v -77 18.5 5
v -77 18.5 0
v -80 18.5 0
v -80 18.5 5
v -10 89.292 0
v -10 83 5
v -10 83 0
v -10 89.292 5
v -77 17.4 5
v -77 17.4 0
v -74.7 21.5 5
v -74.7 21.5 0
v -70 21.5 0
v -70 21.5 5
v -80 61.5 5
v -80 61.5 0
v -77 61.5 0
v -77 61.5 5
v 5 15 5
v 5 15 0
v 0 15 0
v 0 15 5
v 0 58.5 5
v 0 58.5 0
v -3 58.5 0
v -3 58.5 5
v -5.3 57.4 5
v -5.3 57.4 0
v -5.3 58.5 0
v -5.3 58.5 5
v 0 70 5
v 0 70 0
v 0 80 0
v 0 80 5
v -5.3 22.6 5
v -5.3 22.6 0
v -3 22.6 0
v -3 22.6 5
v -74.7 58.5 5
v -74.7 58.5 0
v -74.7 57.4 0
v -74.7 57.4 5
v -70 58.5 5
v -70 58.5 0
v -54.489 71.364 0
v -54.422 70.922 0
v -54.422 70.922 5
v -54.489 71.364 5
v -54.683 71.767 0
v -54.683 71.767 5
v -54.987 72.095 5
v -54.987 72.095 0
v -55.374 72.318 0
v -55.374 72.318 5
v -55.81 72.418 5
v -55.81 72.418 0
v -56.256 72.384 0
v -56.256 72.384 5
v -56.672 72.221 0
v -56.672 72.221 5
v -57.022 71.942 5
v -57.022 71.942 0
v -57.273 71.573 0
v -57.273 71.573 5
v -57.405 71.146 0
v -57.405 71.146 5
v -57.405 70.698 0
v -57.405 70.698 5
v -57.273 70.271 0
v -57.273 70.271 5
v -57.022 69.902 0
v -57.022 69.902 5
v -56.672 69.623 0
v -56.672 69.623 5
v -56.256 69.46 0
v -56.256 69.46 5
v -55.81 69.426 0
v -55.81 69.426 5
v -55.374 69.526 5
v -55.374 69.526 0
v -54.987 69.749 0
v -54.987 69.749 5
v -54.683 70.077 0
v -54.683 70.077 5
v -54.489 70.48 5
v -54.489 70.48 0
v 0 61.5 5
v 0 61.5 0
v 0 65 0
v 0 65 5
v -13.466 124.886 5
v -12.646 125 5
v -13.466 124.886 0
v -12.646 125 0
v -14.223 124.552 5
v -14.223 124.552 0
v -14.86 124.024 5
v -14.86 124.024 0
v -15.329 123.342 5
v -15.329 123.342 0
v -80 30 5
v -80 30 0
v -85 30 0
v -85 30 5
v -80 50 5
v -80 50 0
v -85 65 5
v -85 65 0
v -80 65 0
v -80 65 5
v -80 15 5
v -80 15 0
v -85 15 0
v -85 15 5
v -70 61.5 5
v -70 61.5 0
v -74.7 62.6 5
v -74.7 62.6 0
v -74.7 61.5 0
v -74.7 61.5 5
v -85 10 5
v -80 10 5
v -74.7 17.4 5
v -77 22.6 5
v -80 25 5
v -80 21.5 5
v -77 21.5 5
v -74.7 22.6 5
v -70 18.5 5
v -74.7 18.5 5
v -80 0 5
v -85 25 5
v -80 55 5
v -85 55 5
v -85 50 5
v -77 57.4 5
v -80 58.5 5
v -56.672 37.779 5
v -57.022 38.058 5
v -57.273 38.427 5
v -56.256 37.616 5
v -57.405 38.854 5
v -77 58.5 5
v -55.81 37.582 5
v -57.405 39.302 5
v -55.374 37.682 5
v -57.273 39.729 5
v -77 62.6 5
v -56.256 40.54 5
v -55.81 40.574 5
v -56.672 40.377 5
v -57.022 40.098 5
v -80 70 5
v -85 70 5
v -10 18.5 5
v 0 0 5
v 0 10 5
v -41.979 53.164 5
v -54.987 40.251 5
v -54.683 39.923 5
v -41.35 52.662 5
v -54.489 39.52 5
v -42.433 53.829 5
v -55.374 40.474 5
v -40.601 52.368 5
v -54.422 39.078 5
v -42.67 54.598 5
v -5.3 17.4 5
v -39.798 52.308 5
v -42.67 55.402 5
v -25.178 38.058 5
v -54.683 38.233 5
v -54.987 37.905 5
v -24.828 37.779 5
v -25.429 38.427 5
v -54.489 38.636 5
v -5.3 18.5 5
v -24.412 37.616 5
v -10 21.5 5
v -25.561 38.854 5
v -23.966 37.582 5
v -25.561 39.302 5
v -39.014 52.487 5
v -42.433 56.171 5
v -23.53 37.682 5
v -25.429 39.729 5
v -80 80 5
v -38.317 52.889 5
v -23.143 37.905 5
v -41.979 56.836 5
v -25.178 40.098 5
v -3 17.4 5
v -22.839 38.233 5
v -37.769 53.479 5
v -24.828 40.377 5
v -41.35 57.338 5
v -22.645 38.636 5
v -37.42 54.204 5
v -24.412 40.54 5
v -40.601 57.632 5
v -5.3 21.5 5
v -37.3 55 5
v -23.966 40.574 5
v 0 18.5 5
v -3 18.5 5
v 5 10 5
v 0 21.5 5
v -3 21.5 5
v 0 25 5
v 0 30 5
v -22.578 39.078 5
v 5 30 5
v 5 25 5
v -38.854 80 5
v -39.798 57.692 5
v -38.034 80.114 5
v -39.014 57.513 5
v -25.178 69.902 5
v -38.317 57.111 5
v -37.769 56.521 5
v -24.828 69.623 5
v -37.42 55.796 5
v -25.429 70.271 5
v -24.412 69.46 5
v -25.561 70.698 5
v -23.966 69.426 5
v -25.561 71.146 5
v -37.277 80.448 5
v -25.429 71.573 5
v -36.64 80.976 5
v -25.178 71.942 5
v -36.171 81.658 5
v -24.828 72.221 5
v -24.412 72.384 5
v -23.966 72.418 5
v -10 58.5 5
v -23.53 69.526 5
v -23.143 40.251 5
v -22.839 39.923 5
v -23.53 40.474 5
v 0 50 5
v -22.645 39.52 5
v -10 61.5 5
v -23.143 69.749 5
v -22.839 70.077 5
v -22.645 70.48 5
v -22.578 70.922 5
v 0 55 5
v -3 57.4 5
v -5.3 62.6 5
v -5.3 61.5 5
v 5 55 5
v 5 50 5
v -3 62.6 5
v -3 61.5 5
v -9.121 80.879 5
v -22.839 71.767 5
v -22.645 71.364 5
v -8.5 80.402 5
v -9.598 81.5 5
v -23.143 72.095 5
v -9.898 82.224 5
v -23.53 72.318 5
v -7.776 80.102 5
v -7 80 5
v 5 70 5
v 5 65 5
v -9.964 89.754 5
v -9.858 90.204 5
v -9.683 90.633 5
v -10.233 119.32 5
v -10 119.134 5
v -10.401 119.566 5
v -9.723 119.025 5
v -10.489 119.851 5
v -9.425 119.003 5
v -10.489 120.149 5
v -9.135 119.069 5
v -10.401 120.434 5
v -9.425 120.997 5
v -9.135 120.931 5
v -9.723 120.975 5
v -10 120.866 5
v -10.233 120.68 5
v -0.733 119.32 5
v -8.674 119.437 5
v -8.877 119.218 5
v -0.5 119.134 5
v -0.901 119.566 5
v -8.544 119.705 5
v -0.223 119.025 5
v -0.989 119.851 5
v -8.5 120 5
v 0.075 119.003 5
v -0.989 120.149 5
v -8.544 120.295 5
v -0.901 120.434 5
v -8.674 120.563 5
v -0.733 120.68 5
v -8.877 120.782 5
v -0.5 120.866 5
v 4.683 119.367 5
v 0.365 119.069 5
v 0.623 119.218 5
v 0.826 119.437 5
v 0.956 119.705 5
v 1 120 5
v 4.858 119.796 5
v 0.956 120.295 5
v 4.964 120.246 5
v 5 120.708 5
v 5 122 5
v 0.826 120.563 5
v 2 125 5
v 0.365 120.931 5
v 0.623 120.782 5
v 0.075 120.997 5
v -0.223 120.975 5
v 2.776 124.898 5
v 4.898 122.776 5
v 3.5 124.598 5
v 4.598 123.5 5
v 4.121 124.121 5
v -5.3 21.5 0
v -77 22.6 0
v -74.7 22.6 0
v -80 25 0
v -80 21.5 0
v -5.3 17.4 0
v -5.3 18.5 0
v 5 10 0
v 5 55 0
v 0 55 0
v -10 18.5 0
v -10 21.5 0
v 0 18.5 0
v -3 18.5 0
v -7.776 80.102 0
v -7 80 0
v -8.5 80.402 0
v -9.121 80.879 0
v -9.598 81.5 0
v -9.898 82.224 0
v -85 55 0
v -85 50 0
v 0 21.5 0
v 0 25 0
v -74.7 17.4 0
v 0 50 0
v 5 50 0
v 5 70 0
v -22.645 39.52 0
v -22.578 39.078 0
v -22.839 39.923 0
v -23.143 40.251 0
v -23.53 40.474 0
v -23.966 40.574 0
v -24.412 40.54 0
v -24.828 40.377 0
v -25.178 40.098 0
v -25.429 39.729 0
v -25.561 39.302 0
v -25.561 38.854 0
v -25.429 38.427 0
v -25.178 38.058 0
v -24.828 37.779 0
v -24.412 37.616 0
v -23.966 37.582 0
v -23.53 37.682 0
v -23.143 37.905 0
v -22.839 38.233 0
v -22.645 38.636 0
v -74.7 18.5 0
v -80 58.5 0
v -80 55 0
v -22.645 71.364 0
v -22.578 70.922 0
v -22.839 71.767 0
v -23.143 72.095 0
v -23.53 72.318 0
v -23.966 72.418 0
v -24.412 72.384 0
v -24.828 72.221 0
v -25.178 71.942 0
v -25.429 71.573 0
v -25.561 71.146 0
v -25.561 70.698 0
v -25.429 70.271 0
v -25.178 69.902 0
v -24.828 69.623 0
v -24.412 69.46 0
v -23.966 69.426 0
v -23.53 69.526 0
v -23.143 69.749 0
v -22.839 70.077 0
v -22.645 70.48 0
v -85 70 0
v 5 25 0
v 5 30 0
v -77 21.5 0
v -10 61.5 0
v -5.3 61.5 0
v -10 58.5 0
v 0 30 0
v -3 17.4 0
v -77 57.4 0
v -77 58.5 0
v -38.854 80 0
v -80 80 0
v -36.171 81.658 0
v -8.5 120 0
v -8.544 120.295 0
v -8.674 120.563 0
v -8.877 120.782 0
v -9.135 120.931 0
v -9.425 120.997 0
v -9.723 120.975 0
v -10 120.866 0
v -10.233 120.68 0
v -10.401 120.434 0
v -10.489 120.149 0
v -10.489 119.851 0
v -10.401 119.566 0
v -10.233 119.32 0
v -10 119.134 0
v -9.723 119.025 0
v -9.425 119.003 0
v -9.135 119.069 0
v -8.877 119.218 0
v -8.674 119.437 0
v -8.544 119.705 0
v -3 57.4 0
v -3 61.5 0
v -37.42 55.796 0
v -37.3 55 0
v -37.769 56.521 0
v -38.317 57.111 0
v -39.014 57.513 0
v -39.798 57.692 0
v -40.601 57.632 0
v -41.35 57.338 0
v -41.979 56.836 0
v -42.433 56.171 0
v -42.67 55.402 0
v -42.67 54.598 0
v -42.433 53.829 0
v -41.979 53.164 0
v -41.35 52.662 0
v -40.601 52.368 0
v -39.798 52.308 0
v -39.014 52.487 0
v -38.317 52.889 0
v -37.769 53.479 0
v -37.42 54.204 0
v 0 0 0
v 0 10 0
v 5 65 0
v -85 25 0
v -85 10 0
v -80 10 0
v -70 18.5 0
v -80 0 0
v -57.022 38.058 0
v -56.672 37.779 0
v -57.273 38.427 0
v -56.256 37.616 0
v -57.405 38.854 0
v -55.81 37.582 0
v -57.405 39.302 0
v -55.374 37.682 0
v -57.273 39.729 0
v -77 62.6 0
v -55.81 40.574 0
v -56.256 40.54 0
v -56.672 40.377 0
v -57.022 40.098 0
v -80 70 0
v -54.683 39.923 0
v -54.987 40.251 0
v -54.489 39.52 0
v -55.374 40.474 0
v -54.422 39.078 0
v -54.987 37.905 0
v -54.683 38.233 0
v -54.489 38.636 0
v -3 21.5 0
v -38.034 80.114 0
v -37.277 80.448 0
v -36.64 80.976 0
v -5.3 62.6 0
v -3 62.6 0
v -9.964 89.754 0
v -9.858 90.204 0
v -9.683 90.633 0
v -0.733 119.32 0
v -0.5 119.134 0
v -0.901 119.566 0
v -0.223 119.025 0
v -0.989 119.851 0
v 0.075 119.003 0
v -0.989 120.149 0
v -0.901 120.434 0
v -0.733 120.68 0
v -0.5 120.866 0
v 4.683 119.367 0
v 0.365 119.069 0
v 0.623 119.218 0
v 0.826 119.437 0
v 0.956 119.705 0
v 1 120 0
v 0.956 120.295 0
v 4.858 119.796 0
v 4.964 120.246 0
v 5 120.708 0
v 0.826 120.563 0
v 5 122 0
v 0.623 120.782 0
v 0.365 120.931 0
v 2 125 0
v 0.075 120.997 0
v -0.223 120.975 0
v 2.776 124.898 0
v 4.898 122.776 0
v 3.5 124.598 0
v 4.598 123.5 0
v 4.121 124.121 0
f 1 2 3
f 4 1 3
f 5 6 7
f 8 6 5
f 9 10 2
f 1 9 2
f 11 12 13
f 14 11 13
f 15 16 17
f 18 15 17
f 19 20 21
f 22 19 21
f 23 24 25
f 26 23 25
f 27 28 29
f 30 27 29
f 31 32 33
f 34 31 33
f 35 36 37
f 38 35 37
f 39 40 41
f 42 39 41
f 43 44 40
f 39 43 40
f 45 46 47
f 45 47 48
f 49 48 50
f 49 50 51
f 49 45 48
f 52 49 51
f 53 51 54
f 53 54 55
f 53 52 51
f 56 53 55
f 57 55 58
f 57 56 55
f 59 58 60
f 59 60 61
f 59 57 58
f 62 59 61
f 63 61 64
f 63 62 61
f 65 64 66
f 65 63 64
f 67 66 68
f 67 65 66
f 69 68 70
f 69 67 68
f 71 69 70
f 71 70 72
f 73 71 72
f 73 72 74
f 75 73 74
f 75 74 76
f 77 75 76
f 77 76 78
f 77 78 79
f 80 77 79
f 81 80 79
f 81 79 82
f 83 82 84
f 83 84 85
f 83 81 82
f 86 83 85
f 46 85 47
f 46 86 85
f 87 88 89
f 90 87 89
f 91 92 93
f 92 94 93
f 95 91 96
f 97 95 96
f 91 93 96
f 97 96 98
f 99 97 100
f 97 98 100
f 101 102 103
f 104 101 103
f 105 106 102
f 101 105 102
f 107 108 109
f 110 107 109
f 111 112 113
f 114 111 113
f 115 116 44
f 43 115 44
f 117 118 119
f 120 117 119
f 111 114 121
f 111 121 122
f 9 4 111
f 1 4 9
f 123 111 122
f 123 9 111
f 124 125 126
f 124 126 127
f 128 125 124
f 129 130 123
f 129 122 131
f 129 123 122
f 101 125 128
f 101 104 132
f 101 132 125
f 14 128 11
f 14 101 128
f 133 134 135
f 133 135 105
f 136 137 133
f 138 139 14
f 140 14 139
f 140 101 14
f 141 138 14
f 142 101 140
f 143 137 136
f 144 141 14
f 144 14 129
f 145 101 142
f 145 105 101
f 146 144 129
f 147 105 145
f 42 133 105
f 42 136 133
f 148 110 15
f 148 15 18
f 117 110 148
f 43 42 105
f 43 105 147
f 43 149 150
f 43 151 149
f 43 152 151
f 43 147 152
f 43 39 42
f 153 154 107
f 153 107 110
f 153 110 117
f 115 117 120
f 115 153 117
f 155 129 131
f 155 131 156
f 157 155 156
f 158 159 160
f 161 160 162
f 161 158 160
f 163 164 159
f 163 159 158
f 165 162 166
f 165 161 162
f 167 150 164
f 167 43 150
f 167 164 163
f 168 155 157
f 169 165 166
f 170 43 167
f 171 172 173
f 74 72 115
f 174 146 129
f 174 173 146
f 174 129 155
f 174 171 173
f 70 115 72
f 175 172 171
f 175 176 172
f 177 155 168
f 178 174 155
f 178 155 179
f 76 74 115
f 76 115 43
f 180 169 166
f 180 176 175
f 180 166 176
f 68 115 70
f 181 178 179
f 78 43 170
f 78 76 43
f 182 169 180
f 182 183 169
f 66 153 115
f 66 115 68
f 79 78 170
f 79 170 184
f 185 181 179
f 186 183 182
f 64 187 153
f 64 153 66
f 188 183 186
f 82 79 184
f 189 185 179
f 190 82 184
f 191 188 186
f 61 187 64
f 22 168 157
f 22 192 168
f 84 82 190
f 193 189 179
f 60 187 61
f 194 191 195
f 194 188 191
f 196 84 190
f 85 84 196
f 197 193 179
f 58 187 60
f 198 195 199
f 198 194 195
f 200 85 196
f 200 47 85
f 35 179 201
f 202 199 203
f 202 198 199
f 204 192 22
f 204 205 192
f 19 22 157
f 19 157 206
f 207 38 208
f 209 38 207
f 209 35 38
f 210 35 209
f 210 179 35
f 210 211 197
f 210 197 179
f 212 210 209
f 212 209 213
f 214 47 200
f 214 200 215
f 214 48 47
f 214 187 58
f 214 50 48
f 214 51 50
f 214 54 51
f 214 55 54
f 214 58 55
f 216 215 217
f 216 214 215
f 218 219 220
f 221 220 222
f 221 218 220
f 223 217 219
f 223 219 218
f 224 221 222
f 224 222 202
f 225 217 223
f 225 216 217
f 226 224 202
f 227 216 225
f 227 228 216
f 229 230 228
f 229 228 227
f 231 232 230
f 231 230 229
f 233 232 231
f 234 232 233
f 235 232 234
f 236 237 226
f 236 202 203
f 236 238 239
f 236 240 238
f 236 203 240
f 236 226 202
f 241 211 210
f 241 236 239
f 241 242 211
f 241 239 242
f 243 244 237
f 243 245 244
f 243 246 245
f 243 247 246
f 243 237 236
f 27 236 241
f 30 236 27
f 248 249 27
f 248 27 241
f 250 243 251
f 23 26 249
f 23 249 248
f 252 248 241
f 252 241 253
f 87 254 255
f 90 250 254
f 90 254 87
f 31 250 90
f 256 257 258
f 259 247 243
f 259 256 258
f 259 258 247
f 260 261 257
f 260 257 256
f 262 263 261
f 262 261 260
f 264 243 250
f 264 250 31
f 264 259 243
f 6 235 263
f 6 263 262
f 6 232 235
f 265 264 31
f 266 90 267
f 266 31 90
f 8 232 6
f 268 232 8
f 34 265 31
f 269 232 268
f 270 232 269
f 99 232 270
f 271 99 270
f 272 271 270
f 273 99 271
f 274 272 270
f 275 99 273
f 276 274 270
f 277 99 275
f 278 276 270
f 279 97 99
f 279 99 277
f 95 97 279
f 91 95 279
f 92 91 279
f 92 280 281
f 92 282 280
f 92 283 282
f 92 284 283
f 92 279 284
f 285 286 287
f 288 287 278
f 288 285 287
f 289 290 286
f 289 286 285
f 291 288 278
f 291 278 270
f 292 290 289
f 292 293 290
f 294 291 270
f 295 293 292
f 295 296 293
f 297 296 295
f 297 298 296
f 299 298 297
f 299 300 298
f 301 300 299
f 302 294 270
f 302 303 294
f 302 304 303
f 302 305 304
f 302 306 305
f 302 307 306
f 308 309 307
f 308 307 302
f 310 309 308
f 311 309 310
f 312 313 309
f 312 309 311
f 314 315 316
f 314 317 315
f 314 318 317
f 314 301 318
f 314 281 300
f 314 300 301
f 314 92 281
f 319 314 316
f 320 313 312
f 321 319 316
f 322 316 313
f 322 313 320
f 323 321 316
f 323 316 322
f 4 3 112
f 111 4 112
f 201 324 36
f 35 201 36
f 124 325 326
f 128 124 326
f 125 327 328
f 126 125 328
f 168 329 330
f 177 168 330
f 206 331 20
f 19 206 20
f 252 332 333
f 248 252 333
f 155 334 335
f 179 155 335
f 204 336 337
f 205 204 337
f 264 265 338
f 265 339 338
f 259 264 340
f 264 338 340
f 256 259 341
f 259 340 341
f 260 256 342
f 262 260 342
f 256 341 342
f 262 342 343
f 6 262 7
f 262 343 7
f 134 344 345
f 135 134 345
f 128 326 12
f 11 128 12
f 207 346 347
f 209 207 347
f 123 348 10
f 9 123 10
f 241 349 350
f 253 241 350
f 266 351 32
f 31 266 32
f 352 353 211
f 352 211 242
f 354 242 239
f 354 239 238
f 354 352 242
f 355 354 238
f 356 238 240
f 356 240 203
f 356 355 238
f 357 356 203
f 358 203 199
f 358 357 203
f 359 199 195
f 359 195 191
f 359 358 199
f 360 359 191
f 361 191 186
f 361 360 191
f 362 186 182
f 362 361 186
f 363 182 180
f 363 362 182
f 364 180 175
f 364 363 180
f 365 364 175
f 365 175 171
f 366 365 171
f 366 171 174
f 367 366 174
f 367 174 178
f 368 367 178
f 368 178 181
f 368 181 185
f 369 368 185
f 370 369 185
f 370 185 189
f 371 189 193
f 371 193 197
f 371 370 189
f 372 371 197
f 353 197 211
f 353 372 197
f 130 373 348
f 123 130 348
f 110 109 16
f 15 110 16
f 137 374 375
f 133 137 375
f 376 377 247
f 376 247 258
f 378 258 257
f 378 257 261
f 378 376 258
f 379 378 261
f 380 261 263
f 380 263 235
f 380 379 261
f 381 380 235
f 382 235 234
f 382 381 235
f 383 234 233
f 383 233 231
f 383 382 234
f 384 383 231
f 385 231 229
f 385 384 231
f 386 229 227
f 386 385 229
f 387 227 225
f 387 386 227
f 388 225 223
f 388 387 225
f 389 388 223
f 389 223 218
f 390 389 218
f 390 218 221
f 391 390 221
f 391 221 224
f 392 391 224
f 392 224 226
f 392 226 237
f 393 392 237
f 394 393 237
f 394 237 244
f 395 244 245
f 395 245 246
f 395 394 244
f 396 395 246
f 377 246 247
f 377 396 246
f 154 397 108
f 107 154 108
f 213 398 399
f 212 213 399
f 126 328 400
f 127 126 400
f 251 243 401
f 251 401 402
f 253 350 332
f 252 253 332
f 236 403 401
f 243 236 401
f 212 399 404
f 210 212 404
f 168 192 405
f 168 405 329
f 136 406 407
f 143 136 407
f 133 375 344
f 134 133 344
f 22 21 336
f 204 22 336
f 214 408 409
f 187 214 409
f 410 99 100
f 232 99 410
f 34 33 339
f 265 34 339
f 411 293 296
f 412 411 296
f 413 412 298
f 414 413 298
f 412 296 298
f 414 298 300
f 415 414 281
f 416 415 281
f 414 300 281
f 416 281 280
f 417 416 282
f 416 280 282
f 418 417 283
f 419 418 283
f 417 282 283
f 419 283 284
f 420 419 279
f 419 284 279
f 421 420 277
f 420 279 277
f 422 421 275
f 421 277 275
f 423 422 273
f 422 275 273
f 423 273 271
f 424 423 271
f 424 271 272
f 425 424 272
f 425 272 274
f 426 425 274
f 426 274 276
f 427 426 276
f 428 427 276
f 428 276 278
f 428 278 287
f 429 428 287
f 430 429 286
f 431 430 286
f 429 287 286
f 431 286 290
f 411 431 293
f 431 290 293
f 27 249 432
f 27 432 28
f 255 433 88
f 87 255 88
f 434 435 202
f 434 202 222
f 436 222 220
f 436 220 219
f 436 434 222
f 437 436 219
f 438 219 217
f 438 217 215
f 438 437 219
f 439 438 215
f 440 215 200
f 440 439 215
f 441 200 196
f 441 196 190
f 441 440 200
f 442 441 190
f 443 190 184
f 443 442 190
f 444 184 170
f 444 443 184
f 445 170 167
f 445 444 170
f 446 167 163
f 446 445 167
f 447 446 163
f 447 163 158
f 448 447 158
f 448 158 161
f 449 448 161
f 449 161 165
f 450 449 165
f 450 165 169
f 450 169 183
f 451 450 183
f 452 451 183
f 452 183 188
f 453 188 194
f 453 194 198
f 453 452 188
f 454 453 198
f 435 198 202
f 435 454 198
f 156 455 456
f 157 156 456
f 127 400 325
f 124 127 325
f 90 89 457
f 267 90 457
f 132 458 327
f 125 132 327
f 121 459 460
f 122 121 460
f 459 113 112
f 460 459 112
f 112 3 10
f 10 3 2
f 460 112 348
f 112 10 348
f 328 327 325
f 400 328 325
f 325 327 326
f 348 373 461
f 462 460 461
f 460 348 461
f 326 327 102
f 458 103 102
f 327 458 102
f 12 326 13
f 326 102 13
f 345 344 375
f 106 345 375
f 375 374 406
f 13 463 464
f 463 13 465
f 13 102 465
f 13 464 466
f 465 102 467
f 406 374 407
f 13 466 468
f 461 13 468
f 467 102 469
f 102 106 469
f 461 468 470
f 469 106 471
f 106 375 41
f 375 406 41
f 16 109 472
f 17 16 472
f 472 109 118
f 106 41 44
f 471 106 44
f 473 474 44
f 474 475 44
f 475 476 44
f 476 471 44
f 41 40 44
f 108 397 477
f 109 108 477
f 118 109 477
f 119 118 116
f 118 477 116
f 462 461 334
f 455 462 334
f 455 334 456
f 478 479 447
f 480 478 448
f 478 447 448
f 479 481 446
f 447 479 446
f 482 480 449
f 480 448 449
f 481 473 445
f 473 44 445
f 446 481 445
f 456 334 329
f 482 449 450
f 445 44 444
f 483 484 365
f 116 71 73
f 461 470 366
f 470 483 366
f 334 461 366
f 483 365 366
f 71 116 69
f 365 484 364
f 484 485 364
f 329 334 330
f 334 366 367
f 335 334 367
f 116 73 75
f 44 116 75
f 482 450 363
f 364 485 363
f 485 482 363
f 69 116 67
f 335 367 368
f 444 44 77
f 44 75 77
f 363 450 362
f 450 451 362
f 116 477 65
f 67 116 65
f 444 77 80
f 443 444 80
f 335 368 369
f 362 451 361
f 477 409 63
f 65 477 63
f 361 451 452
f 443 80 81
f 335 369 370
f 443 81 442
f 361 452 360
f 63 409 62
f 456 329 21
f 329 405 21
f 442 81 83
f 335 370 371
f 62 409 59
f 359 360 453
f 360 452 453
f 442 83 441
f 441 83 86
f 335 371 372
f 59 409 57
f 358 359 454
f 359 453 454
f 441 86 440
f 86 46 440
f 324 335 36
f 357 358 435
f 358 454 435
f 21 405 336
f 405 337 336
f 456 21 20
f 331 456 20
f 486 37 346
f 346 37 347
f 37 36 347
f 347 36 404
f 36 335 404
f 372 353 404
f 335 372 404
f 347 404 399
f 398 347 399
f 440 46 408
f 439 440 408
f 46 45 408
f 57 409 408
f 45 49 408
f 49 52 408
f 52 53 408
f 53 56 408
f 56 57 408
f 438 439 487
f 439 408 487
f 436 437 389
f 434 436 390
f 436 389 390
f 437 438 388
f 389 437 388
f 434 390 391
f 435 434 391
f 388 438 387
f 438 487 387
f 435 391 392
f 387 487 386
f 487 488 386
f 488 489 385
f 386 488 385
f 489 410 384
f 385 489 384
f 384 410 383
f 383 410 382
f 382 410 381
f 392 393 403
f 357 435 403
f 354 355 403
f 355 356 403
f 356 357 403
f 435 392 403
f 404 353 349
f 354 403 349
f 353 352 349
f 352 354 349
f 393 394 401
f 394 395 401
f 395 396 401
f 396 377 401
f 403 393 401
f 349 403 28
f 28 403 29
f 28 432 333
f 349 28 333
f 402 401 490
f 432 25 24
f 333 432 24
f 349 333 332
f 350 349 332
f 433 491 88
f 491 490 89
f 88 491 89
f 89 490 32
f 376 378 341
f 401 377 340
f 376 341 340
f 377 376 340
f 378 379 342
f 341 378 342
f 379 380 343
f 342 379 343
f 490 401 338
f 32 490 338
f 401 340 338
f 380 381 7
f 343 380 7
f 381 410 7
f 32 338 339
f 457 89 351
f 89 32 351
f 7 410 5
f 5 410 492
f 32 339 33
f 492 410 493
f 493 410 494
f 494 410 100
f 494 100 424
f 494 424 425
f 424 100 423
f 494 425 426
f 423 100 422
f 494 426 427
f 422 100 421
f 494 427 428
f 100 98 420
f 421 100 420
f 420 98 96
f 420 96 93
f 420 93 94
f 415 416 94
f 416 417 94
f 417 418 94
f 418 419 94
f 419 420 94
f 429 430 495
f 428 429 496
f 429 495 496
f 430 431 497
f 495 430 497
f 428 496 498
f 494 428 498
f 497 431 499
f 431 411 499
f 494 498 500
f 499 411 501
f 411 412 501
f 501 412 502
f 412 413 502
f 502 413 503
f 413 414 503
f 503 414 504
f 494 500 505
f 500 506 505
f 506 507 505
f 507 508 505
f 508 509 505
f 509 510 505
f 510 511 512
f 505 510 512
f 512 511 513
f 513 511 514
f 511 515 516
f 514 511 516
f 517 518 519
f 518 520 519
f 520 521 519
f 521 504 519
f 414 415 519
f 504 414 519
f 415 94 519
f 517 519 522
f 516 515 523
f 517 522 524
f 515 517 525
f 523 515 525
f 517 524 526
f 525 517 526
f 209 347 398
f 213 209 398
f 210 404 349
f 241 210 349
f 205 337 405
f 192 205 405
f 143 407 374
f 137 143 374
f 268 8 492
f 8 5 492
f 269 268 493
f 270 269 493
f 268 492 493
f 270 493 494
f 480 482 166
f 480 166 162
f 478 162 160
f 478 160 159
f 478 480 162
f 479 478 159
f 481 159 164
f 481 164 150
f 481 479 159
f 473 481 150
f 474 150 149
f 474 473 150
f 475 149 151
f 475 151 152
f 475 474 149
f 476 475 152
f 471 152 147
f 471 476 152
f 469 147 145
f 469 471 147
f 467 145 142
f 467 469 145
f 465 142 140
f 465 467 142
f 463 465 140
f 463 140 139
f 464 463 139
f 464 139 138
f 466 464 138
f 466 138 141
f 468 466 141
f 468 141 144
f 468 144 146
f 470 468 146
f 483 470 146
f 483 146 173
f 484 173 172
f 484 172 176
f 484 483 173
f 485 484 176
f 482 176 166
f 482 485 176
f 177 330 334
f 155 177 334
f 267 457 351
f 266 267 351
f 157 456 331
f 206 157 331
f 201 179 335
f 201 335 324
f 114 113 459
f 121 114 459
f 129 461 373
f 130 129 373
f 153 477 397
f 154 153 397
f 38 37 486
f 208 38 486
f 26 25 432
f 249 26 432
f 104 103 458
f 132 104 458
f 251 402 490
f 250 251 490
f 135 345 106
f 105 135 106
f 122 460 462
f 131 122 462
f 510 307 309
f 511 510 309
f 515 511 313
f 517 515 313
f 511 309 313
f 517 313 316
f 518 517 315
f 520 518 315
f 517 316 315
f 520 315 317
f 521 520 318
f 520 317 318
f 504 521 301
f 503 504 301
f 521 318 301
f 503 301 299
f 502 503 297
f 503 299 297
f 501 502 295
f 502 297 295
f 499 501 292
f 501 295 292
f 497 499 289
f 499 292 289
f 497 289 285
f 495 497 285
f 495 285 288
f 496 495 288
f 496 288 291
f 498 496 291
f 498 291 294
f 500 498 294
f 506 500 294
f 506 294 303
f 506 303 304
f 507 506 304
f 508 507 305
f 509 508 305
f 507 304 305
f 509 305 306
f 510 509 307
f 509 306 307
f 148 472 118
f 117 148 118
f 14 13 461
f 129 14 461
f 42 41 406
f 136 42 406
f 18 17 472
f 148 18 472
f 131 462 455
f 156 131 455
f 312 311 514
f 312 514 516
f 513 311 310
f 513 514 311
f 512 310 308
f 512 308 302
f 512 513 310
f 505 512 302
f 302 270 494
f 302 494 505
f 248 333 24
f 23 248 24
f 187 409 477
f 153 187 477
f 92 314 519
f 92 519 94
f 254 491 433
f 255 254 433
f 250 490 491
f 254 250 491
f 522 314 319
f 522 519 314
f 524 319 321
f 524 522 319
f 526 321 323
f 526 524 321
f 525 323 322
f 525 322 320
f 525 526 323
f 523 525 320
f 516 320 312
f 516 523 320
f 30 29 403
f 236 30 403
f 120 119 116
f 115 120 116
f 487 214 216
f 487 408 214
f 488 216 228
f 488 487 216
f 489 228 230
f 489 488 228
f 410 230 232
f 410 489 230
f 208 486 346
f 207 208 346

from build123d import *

# Parameters (mm, degrees)
SKETCH1_R           = 1.5
SKETCH1_R_2         = 11.5
BOSS_EXTRUDE1_DEPTH = 5
BOSS_EXTRUDE2_START = -5
SKETCH2_R           = 11.5
SKETCH2_R_2         = 2.7
BOSS_EXTRUDE2_DEPTH = 5
SKETCH3_R           = 1
BOSS_EXTRUDE3_DEPTH = 5
FILLET1_R           = 3


with BuildPart() as part:
    # Sketch1 → Boss-Extrude1 (new body)
    with BuildSketch(Plane.XY):
        Polygon((0, 80), (-80, 80), (-80, 70), (-85, 70), (-85, 65), (-80, 65), (-80, 61.5), (-77, 61.5), (-77, 62.6), (-74.7, 62.6), (-74.7, 61.5), (-70, 61.5), (-70, 58.5), (-74.7, 58.5), (-74.7, 57.4), (-77, 57.4), (-77, 58.5), (-80, 58.5), (-80, 55), (-85, 55), (-85, 50), (-80, 50), (-80, 30), (-85, 30), (-85, 25), (-80, 25), (-80, 21.5), (-77, 21.5), (-77, 22.6), (-74.7, 22.6), (-74.7, 21.5), (-70, 21.5), (-70, 18.5), (-74.7, 18.5), (-74.7, 17.4), (-77, 17.4), (-77, 18.5), (-80, 18.5), (-80, 15), (-85, 15), (-85, 10), (-80, 10), (-80, 0), (0, 0), (0, 10), (5, 10), (5, 15), (0, 15), (0, 18.5), (-3, 18.5), (-3, 17.4), (-5.3, 17.4), (-5.3, 18.5), (-10, 18.5), (-10, 21.5), (-5.3, 21.5), (-5.3, 22.6), (-3, 22.6), (-3, 21.5), (0, 21.5), (0, 25), (5, 25), (5, 30), (0, 30), (0, 50), (5, 50), (5, 55), (0, 55), (0, 58.5), (-3, 58.5), (-3, 57.4), (-5.3, 57.4), (-5.3, 58.5), (-10, 58.5), (-10, 61.5), (-5.3, 61.5), (-5.3, 62.6), (-3, 62.6), (-3, 61.5), (0, 61.5), (0, 65), (5, 65), (5, 70), (0, 70), align=None)
        with Locations((-55.922, 70.922)):
            Circle(SKETCH1_R, mode=Mode.SUBTRACT)
        with Locations((-24.078, 70.922)):
            Circle(SKETCH1_R, mode=Mode.SUBTRACT)
        with Locations((-24.078, 39.078)):
            Circle(SKETCH1_R, mode=Mode.SUBTRACT)
        with Locations((-55.922, 39.078)):
            Circle(SKETCH1_R, mode=Mode.SUBTRACT)
        with Locations((-40, 55)):
            Circle(SKETCH1_R_2, mode=Mode.SUBTRACT)
    extrude(amount=BOSS_EXTRUDE1_DEPTH)

    # Sketch2 → Boss-Extrude2 (add)
    with BuildSketch(Plane.XY.offset(5).offset(BOSS_EXTRUDE2_START)):
        with Locations((-40, 55)):
            Circle(SKETCH2_R)
        with Locations((-40, 55)):
            Circle(SKETCH2_R_2, mode=Mode.SUBTRACT)
    extrude(amount=BOSS_EXTRUDE2_DEPTH)

    # Sketch3 → Boss-Extrude3 (add)
    with BuildSketch(Plane.XY.offset(5)):
        Polygon((5, 125), (-14.5, 125), (-37, 80), (-10, 80), (-10, 90), (5, 120), align=None)
        with Locations((-9.5, 120)):
            Circle(SKETCH3_R, mode=Mode.SUBTRACT)
        with Locations((0, 120)):
            Circle(SKETCH3_R, mode=Mode.SUBTRACT)
    extrude(amount=-BOSS_EXTRUDE3_DEPTH)

    # Fillet1
    fillet1_edges = [part.edges().sort_by_distance(p)[0] for p in [
        (-10, 90, 2.5),
        (-10, 80, 2.5),
        (-37, 80, 2.5),
        (-14.5, 125, 2.5),
        (5, 125, 2.5),
        (5, 120, 2.5),
    ]]
    fillet(fillet1_edges, radius=FILLET1_R)


solid = part.part
